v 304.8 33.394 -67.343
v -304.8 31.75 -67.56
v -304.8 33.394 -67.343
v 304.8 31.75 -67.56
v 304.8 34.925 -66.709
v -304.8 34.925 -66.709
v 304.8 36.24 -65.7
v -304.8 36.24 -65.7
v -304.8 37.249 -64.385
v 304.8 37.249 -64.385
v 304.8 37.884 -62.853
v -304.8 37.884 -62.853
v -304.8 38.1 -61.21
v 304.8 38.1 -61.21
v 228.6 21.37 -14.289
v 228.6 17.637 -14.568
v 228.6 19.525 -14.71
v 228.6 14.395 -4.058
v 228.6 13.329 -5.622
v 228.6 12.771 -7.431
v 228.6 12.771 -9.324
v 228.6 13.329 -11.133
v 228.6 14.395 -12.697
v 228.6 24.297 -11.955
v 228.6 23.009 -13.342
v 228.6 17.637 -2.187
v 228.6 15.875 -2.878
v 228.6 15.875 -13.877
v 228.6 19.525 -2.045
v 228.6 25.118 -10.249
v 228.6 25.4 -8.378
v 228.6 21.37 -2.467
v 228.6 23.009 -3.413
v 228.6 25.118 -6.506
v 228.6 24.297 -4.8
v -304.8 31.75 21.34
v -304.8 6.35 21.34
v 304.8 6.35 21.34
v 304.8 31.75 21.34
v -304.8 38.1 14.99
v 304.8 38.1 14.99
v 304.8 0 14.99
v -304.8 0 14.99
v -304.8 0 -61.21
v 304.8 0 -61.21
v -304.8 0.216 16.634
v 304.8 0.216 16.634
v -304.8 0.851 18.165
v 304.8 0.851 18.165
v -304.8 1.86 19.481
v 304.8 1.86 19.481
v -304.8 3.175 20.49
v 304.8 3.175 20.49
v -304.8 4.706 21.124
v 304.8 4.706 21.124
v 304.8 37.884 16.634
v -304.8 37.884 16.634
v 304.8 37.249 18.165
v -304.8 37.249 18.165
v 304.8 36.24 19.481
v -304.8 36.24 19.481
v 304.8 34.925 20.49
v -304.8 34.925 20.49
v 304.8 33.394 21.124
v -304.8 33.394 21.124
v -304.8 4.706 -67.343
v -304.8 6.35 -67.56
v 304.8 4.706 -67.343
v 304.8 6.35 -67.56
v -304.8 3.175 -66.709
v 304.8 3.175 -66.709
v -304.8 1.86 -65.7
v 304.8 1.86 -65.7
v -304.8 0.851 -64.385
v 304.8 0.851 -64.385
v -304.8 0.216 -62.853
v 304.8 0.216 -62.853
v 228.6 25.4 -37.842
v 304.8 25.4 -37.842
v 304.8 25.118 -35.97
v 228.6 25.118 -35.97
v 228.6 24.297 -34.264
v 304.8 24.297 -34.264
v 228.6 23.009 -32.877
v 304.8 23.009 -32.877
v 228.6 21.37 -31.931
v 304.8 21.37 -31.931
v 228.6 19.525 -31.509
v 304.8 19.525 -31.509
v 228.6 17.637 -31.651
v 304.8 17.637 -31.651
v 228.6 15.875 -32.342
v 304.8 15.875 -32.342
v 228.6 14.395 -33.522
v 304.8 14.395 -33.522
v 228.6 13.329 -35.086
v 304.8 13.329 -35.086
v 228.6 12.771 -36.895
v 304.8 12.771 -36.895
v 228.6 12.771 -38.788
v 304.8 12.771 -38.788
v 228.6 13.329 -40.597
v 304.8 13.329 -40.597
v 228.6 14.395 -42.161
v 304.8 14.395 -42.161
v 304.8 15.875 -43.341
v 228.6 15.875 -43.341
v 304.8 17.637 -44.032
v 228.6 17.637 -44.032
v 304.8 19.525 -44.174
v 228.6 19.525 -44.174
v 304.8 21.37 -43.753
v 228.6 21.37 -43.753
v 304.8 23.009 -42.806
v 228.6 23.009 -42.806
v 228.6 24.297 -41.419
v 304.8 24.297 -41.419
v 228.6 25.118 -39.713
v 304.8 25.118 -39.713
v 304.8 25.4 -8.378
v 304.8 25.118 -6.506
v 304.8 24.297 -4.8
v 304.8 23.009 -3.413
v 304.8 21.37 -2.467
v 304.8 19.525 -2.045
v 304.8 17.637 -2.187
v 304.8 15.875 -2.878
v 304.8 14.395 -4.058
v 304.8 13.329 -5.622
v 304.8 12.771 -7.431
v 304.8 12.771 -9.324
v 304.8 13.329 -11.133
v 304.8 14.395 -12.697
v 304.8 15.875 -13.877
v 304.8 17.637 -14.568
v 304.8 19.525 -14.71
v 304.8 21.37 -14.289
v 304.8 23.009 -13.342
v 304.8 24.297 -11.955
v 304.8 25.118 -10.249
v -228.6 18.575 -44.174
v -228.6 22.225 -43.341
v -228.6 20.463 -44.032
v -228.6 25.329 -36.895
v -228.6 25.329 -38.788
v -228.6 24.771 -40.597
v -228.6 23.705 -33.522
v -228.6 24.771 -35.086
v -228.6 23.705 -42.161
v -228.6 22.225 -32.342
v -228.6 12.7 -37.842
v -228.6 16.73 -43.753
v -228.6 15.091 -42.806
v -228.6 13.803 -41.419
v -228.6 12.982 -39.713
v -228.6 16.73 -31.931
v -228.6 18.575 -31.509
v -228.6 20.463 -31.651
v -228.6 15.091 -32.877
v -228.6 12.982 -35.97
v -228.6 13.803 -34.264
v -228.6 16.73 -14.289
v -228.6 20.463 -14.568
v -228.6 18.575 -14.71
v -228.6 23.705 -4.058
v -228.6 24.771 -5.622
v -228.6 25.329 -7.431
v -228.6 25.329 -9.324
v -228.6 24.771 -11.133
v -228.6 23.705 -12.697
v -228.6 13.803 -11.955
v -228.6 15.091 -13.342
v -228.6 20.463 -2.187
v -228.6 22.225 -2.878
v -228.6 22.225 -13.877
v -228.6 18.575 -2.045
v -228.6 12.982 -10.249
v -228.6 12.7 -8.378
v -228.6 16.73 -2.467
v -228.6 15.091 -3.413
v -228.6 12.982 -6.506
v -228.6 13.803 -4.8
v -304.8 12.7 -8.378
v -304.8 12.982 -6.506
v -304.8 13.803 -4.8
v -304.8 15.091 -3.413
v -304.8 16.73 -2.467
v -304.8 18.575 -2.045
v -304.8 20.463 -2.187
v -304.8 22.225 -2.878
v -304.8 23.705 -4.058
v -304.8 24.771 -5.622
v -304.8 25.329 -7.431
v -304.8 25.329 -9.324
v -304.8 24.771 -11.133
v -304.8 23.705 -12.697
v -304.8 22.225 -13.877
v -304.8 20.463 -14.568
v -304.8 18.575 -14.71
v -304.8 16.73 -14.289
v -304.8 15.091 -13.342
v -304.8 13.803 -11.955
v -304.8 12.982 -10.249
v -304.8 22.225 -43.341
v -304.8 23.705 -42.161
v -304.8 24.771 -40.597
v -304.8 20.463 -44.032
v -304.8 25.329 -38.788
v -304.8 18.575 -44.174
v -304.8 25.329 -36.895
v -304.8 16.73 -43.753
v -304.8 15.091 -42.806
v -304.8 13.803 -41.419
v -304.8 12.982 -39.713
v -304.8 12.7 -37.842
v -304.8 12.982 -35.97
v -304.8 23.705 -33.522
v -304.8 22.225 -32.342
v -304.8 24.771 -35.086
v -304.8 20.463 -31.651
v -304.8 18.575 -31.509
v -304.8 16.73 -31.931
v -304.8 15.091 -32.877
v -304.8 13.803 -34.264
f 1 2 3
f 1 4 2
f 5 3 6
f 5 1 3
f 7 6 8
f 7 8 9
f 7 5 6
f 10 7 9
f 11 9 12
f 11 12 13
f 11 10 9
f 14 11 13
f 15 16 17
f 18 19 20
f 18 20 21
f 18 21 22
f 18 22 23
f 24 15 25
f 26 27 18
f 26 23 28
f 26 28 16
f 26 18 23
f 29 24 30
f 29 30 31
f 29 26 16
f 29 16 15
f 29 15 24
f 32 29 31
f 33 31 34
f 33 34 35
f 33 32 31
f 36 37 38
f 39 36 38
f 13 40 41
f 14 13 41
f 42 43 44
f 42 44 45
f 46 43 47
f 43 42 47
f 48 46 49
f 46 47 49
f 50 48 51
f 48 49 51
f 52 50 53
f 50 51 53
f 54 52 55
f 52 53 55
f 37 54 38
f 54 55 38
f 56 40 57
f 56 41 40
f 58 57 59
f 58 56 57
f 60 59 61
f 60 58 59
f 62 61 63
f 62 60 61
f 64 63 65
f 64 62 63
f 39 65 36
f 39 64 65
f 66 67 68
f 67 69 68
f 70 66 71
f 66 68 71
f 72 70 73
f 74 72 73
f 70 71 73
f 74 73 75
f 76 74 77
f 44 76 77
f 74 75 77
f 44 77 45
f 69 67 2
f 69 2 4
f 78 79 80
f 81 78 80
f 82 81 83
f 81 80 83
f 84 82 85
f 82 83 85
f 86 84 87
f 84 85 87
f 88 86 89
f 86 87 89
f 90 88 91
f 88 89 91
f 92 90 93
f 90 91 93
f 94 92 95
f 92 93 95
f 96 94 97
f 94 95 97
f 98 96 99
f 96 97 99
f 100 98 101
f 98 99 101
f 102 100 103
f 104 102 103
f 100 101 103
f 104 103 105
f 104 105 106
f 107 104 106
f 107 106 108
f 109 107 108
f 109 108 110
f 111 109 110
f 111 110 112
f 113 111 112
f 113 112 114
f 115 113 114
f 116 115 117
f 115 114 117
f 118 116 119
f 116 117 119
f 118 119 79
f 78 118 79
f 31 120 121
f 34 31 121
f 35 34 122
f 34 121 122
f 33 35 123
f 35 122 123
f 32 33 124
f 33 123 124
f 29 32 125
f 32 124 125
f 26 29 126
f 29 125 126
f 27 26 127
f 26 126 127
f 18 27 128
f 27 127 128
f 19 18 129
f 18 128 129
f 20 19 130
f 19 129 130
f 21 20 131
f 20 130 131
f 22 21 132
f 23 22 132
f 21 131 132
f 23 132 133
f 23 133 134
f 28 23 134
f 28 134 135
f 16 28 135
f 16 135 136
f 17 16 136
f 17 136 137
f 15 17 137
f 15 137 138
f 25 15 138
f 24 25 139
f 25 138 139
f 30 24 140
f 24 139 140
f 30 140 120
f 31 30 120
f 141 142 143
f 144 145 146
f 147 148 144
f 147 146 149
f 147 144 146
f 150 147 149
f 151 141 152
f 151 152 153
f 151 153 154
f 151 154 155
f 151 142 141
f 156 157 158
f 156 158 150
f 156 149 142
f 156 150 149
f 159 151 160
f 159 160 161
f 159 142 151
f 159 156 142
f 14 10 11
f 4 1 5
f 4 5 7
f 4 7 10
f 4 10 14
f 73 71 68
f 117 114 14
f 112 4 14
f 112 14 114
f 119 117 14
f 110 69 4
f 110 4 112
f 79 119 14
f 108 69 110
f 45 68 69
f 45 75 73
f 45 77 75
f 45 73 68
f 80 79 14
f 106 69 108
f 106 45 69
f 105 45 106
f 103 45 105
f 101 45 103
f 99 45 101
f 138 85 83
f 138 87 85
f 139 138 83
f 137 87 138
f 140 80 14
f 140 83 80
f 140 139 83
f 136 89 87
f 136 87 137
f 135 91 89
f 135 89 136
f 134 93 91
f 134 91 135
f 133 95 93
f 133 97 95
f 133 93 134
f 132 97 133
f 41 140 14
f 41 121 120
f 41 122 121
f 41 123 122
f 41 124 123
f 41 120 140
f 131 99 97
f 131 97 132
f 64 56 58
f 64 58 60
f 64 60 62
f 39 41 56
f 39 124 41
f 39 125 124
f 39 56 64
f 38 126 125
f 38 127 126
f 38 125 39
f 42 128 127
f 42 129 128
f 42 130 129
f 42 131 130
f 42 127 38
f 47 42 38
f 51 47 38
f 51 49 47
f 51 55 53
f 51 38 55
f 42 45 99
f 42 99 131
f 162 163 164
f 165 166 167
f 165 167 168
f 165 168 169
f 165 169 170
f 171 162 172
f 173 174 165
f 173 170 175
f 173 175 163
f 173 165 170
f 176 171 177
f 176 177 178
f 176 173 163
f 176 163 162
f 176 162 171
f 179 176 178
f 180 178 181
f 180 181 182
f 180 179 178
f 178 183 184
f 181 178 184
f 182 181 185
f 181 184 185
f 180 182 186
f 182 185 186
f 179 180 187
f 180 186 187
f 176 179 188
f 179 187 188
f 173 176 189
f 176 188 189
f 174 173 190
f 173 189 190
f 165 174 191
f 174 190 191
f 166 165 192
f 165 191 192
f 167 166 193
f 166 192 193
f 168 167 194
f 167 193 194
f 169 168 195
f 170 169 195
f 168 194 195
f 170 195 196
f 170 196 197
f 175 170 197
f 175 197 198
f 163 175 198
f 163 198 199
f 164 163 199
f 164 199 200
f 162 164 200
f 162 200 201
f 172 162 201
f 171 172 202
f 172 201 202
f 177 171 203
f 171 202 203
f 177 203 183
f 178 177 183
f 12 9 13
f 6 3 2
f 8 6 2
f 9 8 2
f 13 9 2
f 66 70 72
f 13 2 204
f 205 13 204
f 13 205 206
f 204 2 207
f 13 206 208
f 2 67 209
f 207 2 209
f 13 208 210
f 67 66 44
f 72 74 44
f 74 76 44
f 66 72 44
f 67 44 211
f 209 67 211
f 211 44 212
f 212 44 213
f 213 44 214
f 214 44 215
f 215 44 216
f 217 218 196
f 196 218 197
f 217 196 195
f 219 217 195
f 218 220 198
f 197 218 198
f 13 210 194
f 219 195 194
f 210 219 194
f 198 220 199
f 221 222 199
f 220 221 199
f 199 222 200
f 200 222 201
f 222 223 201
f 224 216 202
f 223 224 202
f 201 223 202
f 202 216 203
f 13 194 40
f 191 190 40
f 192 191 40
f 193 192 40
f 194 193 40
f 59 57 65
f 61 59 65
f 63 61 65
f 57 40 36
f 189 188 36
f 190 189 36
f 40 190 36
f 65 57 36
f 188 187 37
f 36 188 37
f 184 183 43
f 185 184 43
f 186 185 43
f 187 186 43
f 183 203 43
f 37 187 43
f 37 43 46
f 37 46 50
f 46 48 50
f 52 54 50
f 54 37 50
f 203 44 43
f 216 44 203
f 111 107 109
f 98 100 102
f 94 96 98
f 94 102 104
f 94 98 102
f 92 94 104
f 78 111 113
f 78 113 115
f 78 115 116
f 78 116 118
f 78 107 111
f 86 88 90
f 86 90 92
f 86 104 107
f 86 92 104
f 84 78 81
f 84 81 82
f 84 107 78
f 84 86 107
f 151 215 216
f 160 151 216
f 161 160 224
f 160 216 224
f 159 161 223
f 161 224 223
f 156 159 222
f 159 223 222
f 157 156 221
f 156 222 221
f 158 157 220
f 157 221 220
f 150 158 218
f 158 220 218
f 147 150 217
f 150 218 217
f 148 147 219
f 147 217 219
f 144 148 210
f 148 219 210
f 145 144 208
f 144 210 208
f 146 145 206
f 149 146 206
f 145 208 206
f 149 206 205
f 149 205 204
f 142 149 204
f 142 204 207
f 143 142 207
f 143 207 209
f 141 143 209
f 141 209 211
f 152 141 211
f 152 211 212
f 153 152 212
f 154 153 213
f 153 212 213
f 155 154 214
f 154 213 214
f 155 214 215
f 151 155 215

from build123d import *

# Parameters (mm, degrees)
F0_W     = 609.6
F0_H     = 88.9
F1_DEPTH = 38.1
F2_R     = 6.35
F5_DEPTH = 76.2
F3_R     = 6.35
F4_DEPTH = 76.2
F6_R     = 6.35


with BuildPart() as f1:
    # F0 (on Front) → F1 (new body)
    with BuildSketch(Plane.XZ):
        with Locations((0, -23.109551)):
            Rectangle(F0_W, F0_H)
    extrude(amount=-F1_DEPTH)

    # F2 (on face) → F5 (cut)
    with BuildSketch(Plane(origin=(-304.8, 0, 0), x_dir=(0, -1, 0), z_dir=(-1, 0, 0))):
        with Locations((-19.05, -8.377551)):
            Circle(F2_R)
        with Locations((-19.05, -37.841551)):
            Circle(F2_R)
    extrude(amount=-F5_DEPTH, mode=Mode.SUBTRACT)

    # F3 (on face) → F4 (cut)
    with BuildSketch(Plane.YZ.offset(304.8)):
        with Locations((19.05, -8.377551)):
            Circle(F3_R)
        with Locations((19.05, -37.841551)):
            Circle(F3_R)
    extrude(amount=-F4_DEPTH, mode=Mode.SUBTRACT)

    # F6
    f6_edges = [f1.edges().sort_by_distance(p)[0] for p in [
        (0, 0, 21.340449),
        (0, 38.1, 21.340449),
        (0, 38.1, -67.559551),
        (0, 0, -67.559551),
    ]]
    fillet(f6_edges, radius=F6_R)


solid = f1.part
